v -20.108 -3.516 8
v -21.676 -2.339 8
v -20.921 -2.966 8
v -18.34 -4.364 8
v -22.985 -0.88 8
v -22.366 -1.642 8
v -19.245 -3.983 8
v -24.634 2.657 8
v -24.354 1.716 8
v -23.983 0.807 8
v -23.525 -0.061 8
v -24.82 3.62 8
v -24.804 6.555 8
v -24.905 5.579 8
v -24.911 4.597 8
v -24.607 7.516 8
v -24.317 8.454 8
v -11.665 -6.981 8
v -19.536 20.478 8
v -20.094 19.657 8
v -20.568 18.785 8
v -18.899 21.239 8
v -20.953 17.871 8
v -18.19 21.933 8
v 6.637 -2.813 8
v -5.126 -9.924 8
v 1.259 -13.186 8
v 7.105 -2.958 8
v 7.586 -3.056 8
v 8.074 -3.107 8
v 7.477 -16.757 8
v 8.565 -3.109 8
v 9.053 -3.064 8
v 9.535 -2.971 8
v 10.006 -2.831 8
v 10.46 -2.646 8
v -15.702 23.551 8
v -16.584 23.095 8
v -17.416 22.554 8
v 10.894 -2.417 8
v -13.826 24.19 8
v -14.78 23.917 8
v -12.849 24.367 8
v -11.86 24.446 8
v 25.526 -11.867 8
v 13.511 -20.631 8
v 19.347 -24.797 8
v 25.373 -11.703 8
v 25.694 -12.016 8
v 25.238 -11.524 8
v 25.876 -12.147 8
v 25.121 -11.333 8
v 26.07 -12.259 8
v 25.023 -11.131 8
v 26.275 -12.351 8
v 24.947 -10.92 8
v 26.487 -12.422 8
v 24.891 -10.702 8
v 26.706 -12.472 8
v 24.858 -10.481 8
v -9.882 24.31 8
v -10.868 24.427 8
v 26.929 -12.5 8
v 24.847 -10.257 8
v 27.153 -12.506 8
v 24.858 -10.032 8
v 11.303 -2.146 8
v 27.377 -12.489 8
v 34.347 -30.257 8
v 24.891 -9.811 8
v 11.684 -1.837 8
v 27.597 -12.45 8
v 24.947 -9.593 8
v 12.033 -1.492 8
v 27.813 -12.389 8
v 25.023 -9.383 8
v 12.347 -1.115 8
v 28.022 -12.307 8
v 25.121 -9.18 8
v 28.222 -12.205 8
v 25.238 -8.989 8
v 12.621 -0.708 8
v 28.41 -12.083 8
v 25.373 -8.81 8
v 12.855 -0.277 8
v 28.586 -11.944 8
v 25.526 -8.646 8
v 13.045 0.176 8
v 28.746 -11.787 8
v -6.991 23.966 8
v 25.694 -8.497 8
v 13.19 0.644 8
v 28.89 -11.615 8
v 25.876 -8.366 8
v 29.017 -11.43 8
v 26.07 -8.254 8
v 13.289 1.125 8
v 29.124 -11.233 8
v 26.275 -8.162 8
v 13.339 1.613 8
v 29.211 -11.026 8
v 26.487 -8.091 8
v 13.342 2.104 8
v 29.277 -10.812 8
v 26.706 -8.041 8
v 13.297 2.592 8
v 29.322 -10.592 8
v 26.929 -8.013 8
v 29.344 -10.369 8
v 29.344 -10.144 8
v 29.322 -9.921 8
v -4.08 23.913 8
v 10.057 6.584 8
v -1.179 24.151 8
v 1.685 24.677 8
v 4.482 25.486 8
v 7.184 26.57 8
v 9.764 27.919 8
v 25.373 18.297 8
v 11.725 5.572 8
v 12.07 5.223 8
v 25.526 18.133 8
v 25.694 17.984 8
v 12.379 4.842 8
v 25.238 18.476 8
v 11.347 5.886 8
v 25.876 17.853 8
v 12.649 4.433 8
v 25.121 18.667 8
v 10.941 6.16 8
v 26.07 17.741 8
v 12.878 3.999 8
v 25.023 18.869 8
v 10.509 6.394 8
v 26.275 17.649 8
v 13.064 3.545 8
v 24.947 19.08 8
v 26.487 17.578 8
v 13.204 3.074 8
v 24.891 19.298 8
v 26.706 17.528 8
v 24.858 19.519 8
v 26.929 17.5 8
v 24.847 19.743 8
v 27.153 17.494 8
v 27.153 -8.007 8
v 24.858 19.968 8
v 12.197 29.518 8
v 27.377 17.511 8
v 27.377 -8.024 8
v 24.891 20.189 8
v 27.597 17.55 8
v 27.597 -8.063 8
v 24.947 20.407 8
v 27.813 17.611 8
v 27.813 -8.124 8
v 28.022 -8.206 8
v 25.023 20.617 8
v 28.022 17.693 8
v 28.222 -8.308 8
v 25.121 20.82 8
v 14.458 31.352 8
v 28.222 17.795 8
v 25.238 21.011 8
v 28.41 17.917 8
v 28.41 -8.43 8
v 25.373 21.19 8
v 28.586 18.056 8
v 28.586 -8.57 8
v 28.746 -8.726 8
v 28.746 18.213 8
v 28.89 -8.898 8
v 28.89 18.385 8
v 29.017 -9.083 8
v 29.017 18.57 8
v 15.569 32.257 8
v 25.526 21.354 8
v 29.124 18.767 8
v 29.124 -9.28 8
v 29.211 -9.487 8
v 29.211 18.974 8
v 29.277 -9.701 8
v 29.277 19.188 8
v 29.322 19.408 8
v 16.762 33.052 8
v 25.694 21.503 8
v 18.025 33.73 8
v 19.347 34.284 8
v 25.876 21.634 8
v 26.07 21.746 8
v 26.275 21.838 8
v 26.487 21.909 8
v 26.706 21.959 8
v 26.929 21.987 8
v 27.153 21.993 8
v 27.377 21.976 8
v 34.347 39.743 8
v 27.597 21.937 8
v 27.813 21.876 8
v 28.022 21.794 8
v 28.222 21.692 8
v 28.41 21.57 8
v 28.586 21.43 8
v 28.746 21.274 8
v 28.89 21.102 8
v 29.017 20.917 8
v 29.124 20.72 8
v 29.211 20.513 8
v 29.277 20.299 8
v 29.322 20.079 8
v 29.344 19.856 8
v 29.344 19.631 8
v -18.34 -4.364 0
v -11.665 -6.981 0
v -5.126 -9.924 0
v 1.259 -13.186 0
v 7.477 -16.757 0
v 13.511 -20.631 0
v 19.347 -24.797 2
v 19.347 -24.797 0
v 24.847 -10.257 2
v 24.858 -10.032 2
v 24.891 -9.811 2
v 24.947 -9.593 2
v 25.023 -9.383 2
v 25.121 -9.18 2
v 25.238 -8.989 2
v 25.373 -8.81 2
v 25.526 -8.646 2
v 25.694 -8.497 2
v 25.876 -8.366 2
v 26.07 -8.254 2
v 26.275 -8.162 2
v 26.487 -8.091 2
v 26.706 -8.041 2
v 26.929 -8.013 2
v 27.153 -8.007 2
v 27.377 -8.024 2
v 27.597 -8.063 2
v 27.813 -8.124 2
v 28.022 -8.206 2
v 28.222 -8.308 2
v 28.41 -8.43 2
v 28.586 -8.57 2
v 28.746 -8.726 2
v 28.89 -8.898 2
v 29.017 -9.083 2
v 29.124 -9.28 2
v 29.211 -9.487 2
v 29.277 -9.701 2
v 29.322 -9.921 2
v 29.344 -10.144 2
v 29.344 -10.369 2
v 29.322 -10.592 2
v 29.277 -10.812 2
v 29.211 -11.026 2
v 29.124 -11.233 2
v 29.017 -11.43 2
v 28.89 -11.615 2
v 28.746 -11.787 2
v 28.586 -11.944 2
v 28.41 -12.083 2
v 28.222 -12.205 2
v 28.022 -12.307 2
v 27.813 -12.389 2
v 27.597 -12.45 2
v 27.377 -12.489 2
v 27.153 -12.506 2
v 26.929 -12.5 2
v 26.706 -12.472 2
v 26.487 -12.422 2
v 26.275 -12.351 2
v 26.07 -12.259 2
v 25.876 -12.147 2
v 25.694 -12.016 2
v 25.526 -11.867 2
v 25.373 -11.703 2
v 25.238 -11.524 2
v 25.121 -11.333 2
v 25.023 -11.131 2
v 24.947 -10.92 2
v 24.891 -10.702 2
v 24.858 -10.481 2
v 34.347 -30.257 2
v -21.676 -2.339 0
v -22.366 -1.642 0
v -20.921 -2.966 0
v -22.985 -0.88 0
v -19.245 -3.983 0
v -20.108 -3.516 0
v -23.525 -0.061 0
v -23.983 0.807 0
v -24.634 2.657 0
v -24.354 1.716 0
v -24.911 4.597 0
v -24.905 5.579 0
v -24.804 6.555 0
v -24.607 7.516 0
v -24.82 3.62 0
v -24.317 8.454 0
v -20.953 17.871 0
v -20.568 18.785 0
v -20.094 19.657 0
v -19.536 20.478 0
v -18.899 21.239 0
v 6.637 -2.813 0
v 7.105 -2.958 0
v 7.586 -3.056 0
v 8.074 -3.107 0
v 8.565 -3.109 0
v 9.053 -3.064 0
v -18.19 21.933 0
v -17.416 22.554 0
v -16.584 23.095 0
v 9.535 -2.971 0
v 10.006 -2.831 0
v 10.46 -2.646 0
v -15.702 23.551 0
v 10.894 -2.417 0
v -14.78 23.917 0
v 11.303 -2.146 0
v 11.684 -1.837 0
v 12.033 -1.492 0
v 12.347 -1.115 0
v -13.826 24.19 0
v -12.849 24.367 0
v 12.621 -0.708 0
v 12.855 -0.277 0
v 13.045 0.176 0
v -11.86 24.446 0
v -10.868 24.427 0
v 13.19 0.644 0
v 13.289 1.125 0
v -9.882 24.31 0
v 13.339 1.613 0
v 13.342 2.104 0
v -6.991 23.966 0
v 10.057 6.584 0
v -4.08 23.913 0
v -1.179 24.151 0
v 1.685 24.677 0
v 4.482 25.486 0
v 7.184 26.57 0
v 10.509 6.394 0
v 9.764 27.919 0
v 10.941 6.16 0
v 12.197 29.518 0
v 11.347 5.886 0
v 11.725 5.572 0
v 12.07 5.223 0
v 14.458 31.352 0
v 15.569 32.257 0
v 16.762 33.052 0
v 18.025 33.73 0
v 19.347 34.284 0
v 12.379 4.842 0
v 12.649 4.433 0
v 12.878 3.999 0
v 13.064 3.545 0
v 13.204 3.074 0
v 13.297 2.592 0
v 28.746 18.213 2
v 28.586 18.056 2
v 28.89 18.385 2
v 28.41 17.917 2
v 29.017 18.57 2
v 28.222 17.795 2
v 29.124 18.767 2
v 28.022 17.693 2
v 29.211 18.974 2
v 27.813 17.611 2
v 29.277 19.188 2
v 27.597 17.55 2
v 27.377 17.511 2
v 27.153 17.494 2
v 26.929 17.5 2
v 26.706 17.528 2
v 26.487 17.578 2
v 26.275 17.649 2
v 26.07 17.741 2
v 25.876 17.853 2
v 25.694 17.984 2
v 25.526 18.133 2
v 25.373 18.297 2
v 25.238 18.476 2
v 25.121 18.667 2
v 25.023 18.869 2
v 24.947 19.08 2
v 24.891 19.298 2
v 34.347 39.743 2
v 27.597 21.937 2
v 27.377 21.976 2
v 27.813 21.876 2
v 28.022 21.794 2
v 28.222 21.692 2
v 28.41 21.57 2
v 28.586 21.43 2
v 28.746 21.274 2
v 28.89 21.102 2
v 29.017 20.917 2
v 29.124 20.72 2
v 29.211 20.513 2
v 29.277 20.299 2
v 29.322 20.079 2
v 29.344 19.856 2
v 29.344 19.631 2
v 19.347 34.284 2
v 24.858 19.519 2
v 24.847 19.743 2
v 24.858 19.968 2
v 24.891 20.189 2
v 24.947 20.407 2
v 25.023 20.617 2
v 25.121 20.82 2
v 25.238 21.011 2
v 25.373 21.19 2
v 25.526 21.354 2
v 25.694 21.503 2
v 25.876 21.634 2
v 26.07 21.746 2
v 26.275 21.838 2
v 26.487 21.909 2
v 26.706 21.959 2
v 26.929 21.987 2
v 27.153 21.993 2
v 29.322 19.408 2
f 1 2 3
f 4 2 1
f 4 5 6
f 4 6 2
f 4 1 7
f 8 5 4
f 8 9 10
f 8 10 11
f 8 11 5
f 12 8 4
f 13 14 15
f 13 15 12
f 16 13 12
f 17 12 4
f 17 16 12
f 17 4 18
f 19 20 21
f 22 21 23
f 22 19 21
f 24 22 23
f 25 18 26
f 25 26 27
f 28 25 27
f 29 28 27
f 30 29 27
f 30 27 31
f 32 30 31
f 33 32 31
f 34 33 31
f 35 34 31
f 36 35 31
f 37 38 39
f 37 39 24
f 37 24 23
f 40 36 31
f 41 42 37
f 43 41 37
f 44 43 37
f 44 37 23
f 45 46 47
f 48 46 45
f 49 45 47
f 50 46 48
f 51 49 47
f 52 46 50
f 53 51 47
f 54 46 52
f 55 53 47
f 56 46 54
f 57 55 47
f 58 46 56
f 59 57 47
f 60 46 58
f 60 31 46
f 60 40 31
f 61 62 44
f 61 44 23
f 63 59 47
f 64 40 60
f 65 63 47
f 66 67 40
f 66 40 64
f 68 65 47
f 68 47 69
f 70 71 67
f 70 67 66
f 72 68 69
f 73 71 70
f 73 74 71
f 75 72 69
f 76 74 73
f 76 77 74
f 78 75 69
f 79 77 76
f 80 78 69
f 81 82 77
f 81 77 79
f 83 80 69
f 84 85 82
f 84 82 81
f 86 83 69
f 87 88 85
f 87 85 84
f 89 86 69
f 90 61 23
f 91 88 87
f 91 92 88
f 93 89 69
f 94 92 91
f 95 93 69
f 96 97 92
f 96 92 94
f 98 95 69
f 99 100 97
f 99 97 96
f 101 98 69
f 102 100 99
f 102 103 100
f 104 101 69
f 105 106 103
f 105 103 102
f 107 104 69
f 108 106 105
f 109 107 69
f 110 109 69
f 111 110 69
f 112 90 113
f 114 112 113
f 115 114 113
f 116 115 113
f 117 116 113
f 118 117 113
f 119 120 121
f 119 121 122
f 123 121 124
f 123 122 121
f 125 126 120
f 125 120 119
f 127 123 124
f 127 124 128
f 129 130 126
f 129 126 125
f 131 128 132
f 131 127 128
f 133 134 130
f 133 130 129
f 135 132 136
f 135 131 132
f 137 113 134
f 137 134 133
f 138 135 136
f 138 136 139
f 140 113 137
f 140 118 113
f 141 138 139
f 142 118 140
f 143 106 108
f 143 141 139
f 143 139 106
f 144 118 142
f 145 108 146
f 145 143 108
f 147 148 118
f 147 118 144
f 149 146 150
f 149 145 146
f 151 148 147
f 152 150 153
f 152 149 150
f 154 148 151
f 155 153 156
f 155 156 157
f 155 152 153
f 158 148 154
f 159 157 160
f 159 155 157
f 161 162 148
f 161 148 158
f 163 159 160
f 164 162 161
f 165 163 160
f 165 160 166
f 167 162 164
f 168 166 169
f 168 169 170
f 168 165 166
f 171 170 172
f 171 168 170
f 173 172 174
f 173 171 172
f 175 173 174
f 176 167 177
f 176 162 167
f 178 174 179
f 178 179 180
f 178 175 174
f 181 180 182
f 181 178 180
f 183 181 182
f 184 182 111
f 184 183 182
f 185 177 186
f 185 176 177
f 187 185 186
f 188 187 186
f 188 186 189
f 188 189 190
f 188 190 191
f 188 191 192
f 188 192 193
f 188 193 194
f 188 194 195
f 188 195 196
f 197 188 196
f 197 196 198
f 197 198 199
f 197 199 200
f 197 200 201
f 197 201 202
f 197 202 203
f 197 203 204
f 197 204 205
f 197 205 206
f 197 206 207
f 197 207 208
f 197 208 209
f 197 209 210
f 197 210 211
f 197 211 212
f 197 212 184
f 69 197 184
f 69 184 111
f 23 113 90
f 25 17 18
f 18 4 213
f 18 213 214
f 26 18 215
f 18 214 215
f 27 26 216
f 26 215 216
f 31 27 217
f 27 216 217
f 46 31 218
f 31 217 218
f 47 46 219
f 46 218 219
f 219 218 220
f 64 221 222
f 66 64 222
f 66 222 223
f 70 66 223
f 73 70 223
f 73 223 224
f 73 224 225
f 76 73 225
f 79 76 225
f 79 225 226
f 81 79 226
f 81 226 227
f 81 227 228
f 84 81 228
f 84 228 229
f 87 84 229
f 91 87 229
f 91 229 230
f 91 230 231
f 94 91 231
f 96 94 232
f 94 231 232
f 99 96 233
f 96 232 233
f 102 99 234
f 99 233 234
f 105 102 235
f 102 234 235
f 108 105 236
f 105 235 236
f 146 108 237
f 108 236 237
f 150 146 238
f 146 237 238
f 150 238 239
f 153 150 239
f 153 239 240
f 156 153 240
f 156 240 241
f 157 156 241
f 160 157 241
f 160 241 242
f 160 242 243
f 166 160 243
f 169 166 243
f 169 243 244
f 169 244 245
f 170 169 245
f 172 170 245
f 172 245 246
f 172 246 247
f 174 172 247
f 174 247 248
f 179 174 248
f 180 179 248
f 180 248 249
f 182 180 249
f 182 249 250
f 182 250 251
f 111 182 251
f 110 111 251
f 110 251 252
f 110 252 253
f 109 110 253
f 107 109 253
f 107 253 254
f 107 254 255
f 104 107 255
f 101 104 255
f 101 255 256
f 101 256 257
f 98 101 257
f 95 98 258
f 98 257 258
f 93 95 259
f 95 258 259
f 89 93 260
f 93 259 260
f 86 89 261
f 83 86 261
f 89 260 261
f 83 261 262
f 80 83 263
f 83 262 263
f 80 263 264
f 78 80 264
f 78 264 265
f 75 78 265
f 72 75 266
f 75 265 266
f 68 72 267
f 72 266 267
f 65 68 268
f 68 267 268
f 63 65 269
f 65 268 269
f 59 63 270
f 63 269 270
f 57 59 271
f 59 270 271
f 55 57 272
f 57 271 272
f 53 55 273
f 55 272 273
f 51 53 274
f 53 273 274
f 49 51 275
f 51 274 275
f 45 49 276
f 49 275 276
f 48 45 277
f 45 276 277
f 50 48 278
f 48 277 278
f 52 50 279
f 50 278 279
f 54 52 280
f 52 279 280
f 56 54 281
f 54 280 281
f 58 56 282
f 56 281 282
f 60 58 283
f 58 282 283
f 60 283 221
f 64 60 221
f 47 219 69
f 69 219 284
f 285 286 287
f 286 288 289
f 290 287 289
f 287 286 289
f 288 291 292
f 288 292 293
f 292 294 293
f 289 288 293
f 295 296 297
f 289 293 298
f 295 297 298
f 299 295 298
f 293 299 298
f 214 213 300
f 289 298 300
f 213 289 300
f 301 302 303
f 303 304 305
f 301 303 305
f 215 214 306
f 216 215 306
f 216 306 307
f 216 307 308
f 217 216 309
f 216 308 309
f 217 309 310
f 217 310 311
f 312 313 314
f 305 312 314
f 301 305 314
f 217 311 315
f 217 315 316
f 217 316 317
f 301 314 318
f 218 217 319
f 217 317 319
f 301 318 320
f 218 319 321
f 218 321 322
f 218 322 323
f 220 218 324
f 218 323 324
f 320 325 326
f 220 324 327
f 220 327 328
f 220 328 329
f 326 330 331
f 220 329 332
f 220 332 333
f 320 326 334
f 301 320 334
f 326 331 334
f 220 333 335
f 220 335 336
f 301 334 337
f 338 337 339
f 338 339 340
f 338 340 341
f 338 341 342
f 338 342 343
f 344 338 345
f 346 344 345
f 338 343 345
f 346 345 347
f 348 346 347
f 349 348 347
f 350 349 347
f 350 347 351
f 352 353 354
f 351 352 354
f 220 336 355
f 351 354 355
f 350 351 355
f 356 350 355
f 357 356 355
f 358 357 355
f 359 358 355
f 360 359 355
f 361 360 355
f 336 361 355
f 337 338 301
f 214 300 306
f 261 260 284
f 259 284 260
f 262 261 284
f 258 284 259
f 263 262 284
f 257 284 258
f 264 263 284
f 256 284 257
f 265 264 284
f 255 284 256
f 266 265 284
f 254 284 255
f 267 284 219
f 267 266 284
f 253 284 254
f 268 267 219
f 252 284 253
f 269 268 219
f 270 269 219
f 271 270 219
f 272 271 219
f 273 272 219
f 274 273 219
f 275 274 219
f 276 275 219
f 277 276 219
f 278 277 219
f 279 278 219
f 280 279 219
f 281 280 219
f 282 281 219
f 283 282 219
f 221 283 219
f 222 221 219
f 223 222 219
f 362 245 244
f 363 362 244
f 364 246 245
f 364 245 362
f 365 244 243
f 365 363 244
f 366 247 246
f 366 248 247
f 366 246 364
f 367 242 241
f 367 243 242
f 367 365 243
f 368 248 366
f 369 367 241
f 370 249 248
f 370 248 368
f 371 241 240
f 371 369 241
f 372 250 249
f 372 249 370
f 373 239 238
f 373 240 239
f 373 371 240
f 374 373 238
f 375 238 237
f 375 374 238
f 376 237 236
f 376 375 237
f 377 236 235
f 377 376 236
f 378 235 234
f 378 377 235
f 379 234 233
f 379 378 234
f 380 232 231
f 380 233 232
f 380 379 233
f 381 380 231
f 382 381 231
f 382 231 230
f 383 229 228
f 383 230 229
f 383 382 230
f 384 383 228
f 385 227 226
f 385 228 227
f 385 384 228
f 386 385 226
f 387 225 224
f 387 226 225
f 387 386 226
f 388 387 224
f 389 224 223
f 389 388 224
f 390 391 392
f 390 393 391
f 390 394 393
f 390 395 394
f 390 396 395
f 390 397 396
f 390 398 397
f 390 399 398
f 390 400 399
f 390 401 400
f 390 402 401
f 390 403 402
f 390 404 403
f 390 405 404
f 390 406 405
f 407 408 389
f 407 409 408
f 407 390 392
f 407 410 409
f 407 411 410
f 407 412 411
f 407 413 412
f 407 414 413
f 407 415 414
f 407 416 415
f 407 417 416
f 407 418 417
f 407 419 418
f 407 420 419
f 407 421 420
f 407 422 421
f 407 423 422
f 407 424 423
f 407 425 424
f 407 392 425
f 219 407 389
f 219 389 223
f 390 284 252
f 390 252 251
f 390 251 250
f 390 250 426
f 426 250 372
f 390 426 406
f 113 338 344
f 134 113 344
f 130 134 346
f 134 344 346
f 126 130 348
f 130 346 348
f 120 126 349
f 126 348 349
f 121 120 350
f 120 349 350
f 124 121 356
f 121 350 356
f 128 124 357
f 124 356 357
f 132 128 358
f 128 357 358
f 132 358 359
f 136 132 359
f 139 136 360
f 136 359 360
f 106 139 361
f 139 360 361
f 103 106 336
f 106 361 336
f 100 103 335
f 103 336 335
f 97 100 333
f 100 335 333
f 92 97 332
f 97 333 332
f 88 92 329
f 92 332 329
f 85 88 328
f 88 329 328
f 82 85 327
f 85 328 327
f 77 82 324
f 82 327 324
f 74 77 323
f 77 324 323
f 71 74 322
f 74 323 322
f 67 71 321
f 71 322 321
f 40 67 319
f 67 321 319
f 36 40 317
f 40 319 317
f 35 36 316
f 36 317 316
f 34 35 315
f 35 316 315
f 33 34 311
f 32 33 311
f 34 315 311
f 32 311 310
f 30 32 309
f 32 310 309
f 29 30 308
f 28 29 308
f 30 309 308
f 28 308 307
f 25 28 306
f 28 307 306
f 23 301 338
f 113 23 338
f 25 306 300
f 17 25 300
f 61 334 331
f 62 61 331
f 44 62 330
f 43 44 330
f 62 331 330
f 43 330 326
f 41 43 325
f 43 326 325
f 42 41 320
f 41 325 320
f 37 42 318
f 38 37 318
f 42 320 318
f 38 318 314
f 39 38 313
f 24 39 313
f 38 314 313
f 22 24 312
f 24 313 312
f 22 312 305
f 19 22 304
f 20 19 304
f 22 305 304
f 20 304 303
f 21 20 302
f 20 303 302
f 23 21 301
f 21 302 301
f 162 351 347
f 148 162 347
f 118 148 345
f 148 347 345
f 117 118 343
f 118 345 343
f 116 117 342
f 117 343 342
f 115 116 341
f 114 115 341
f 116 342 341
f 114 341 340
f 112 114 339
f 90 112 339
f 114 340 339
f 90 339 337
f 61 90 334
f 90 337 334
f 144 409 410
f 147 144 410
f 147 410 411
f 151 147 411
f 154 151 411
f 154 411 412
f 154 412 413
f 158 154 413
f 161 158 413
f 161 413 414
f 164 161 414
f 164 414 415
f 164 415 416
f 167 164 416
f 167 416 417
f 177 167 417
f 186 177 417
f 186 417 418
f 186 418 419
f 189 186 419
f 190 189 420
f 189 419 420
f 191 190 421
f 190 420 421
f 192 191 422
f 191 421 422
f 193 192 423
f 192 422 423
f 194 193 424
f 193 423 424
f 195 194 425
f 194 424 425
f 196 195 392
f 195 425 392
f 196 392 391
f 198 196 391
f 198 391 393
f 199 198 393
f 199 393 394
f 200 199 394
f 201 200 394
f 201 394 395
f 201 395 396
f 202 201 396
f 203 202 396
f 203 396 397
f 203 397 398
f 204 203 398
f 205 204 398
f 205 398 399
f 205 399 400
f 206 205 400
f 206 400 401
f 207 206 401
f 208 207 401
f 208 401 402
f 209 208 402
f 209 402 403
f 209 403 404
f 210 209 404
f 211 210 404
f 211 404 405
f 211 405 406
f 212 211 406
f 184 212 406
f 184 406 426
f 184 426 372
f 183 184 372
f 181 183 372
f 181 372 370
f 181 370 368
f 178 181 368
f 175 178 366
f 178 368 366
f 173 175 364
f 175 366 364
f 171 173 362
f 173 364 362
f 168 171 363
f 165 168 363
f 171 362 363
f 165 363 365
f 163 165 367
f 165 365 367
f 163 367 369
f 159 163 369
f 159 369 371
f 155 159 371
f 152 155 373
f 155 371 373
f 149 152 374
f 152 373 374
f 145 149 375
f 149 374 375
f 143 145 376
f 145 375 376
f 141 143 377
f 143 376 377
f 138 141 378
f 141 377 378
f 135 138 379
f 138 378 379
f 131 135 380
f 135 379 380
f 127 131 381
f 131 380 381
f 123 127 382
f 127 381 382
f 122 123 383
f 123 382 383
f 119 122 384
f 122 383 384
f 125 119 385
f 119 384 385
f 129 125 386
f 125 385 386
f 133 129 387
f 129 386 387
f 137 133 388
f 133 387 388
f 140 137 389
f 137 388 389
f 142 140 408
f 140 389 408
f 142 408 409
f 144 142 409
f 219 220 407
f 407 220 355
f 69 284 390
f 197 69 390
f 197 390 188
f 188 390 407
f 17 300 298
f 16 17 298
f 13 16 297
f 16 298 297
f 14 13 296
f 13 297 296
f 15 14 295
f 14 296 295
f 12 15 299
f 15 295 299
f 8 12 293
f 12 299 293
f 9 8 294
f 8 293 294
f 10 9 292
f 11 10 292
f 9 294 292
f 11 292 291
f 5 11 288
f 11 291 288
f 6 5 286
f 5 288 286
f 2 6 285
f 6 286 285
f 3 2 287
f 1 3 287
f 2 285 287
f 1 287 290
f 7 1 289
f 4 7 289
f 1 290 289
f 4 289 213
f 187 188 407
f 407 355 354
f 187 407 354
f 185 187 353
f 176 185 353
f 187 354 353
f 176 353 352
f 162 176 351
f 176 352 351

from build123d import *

# Parameters (mm, degrees)
EXTRUSION1_DEPTH = 8
ESQUISSE5_W      = 17.091778577
ESQUISSE5_H      = 76.980294062
EXTRUSION3_DEPTH = 2
ESQUISSE6_R      = 2.25
EXTRUSION4_DEPTH = 7


with BuildPart() as part:
    # Esquisse1 → Extrusion1 (new body)
    with BuildSketch(Plane.XY):
        with BuildLine():
            Line((34.346799903, -30.256527517), (34.346799903, 39.743472483))
            Line((34.346799903, 39.743472483), (19.346799903, 34.283918969))
            ThreePointArc((19.346799903, 34.283918969), (16.761888626, 33.052257025), (14.45811141, 31.351854722))
            ThreePointArc((14.45811141, 31.351854722), (3.093427207, 25.046605726), (-9.882286187, 24.309670273))
            ThreePointArc((-9.882286187, 24.309670273), (-16.583574554, 23.095028583), (-20.952955866, 17.870937546))
            Line((-20.952955866, 17.870937546), (10.05690062, 6.584272816))
            ThreePointArc((10.05690062, 6.584272816), (13.045263007, 0.175708995), (6.636699186, -2.812653392))
            Line((6.636699186, -2.812653392), (-24.3170743, 8.453598795))
            ThreePointArc((-24.3170743, 8.453598795), (-23.983225962, 0.807214745), (-18.340349525, -4.363528846))
            ThreePointArc((-18.340349525, -4.363528846), (1.25940449, -13.185565307), (19.346799903, -24.796974003))
            Line((19.346799903, -24.796974003), (34.346799903, -30.256527517))
        make_face()
    extrude(amount=EXTRUSION1_DEPTH)

    # Esquisse5 → Extrusion3 (cut)
    with BuildSketch(Plane(origin=(0, 0, 0), x_dir=(-1, 0, 0), z_dir=(0, 0, -1))):
        with Locations((-27.892689192, 3.666825014)):
            Rectangle(ESQUISSE5_W, ESQUISSE5_H)
    extrude(amount=-EXTRUSION3_DEPTH, mode=Mode.SUBTRACT)

    # Esquisse6 → Extrusion4 (cut, through all)
    with BuildSketch(Plane(origin=(0, 0, 2), x_dir=(-1, 0, 0), z_dir=(0, 0, -1))):
        with Locations((-27.096799903, 19.743472483)):
            Circle(ESQUISSE6_R)
        with Locations((-27.096799903, -10.256527517)):
            Circle(ESQUISSE6_R)
    extrude(amount=-EXTRUSION4_DEPTH, mode=Mode.SUBTRACT)


solid = part.part
